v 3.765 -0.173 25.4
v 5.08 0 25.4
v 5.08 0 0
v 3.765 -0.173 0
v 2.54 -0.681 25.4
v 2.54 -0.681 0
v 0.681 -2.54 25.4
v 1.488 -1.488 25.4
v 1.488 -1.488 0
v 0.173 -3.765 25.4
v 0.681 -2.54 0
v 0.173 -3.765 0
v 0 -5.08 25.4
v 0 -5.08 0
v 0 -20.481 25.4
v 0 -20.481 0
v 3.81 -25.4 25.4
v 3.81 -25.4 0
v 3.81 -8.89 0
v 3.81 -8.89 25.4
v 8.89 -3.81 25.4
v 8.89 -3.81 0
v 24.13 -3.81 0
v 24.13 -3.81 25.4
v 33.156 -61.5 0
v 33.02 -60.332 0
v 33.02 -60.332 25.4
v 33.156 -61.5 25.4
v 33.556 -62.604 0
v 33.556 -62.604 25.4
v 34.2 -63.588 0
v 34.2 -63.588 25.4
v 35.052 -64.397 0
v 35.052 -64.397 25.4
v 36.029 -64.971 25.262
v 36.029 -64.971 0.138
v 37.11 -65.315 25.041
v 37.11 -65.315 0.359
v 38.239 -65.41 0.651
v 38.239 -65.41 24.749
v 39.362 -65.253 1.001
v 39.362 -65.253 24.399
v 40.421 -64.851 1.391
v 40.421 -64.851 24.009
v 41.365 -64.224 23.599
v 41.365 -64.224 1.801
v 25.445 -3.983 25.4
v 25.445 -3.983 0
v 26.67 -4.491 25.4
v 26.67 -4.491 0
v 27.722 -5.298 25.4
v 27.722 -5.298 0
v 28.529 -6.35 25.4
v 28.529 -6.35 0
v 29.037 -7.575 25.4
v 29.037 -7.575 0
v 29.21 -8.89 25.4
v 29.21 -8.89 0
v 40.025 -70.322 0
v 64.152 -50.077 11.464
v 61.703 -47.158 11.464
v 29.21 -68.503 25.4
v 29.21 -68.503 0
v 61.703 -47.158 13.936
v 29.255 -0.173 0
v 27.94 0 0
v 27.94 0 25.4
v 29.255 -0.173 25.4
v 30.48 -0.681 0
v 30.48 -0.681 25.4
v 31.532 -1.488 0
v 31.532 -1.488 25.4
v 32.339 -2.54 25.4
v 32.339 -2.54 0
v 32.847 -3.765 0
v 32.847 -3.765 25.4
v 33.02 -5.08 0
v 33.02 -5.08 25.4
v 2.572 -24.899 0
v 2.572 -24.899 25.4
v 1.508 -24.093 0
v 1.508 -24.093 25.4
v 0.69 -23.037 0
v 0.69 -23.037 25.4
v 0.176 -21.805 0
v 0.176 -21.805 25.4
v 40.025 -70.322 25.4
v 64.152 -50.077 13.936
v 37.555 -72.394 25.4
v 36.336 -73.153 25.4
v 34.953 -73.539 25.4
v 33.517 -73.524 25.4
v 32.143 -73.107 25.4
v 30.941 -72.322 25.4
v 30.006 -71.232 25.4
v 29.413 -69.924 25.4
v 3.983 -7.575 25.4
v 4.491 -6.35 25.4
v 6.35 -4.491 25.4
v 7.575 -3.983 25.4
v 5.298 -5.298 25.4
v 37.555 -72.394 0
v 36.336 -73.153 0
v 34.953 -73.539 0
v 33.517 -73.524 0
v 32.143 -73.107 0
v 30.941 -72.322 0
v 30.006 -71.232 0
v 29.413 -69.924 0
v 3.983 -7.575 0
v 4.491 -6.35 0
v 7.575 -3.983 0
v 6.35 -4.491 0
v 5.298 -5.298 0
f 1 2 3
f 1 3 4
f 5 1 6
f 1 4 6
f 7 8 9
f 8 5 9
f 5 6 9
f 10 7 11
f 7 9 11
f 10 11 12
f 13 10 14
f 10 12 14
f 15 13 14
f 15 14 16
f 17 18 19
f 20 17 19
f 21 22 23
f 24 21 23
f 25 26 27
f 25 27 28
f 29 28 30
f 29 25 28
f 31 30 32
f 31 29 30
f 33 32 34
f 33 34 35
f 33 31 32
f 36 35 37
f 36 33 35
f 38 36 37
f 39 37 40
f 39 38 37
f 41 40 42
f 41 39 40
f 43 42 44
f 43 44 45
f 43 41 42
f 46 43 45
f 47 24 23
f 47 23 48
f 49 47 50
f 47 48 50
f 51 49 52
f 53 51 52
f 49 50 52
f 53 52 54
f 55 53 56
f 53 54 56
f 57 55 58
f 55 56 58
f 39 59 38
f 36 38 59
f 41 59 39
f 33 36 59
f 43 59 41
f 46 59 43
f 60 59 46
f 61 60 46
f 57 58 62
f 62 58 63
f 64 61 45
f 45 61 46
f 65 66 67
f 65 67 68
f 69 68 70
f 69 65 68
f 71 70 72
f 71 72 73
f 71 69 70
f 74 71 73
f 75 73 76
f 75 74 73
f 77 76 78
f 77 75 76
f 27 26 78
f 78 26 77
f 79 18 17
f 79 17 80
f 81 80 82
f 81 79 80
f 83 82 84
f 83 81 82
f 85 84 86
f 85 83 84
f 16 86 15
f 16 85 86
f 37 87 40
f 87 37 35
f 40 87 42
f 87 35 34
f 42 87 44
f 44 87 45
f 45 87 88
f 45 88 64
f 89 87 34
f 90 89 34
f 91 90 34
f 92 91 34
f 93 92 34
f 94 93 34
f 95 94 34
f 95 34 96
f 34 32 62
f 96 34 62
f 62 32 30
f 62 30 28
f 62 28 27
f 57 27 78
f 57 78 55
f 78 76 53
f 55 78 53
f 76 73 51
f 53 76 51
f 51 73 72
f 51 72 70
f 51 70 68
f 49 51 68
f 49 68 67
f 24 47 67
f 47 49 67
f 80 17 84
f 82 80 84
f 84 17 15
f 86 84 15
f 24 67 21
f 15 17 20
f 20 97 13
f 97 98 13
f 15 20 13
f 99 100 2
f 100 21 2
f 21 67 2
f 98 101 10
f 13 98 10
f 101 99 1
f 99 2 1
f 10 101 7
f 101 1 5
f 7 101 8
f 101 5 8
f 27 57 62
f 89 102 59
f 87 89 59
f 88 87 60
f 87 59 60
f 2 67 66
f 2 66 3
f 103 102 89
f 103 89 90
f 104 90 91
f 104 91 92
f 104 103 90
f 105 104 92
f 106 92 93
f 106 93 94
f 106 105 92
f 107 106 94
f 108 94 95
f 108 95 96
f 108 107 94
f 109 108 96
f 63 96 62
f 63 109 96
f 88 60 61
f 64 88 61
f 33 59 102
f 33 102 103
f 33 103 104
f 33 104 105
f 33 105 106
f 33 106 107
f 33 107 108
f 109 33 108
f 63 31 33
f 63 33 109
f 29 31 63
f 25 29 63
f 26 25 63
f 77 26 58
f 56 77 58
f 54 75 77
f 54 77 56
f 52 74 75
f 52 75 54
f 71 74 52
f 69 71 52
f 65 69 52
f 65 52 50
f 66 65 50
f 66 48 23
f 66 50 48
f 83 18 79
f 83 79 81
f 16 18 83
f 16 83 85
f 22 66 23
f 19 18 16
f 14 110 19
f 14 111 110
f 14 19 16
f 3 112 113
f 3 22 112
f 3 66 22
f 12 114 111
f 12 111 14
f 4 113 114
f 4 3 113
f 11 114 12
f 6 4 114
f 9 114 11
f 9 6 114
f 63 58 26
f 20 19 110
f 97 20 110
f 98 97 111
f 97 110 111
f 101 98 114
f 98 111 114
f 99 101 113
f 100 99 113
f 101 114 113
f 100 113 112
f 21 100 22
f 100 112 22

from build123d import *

# Parameters (mm, degrees)
F1_DEPTH     = 25.4
F2_T1_DEPTH  = 25.4
F2_T3_DEPTH  = 25.4
F2_T5_DEPTH  = 25.4
F2_T7_DEPTH  = 50.8
F2_T9_DEPTH  = 50.8
F2_T11_DEPTH = 49.9934442484
F3_SIZE2     = 11.4636064984
F3_SIZE      = 31.496
F3_2_SIZE2   = 11.4636064984
F3_2_SIZE    = 31.496
F4_T1_DEPTH  = 50.8
F5_T1_DEPTH  = 68.1227876391


# Not quite as in the source:
# - a fillet or chamfer that OpenCascade refuses, or shapes differently, is made with other operations: its cross-section is extruded or revolved along the edge and cut away or added


with BuildPart() as f1:
    # F0 (on Top) → F1 (new body)
    with BuildSketch(Plane.XY):
        Polygon((33.02, 0), (0, 0), (0, -25.4), (3.81, -25.4), (3.81, -3.81), (29.21, -3.81), (29.21, -76.2), (33.02, -76.2), (33.02, -71.2263982276), align=None)
        Polygon((61.7030253754, -47.1584822141), (33.02, -71.2263982276), (33.02, -76.2), (64.1520461684, -50.0771115423), align=None)
    extrude(amount=F1_DEPTH)

    # F2: fillet of radius 5.08 on 6 edges, made by hand

    # F2_s2 → F2_t1 (join)
    with BuildSketch(Plane.XY):
        with BuildLine():
            ThreePointArc((3.81, -8.89), (5.2978975516, -5.2978975516), (8.89, -3.81))
            Line((8.89, -3.81), (3.81, -3.81))
            Line((3.81, -3.81), (3.81, -8.89))
        make_face()
    extrude(amount=F2_T1_DEPTH)

    # F2_s4 → F2_t3 (join)
    with BuildSketch(Plane.XY):
        with BuildLine():
            ThreePointArc((24.13, -3.81), (27.7221024484, -5.2978975516), (29.21, -8.89))
            Line((29.21, -8.89), (29.21, -3.81))
            Line((29.21, -3.81), (24.13, -3.81))
        make_face()
    extrude(amount=F2_T3_DEPTH)

    # F2_s6 → F2_t5 (join)
    with BuildSketch(Plane.XY):
        with BuildLine():
            ThreePointArc((33.02, -60.3323030715), (35.9530992304, -64.9363466296), (41.3653610572, -64.2238088425))
            Line((41.3653610572, -64.2238088425), (33.02, -71.2263982276))
            Line((33.02, -71.2263982276), (33.02, -60.3323030715))
        make_face()
    extrude(amount=F2_T5_DEPTH)

    # F2_s8 → F2_t7 (cut)
    with BuildSketch(Plane.XY.offset(-12.7)):
        with BuildLine():
            ThreePointArc((27.94, 0), (31.5321024484, -1.4878975516), (33.02, -5.08))
            Line((33.02, -5.08), (33.02, 0))
            Line((33.02, 0), (27.94, 0))
        make_face()
    extrude(amount=F2_T7_DEPTH, mode=Mode.SUBTRACT)

    # F2_s10 → F2_t9 (cut)
    with BuildSketch(Plane.XY.offset(-12.7)):
        with BuildLine():
            ThreePointArc((5.08, 0), (1.4878975516, -1.4878975516), (0, -5.08))
            Line((0, -5.08), (0, 0))
            Line((0, 0), (5.08, 0))
        make_face()
    extrude(amount=F2_T9_DEPTH, mode=Mode.SUBTRACT)

    # F2_s12 → F2_t11 (cut)
    with BuildSketch(Plane.XY.offset(-12.2967221242)):
        with BuildLine():
            ThreePointArc((3.81, -25.4), (1.0639073716, -23.5921631237), (0, -20.4813111503))
            Line((0, -20.4813111503), (0, -25.4))
            Line((0, -25.4), (3.81, -25.4))
        make_face()
    extrude(amount=F2_T11_DEPTH, mode=Mode.SUBTRACT)

    # F3
    f3_edges = [f1.edges().sort_by_distance(p)[0] for p in [
        (62.927536, -48.617797, 25.4),
    ]]
    f3_side = f1.faces().sort_by_distance((30.827761, -2.192239, 25.4))[0]
    chamfer(f3_edges, length=F3_SIZE, length2=F3_SIZE2, reference=f3_side)

    # F3#2
    f3_2_edges = [f1.edges().sort_by_distance(p)[0] for p in [
        (62.927536, -48.617797, 0),
    ]]
    f3_2_side = f1.faces().sort_by_distance((30.827761, -2.192239, 0))[0]
    chamfer(f3_2_edges, length=F3_2_SIZE, length2=F3_2_SIZE2, reference=f3_2_side)

    # F4: fillet of radius 5.08 on 1 edges, made by hand

    # F4_s2 → F4_t1 (cut)
    with BuildSketch(Plane.XY.offset(-12.7)):
        with BuildLine():
            ThreePointArc((34.29, -76.2), (30.6978975516, -74.7121024484), (29.21, -71.12))
            Line((29.21, -71.12), (29.21, -76.2))
            Line((29.21, -76.2), (34.29, -76.2))
        make_face()
    extrude(amount=F4_T1_DEPTH, mode=Mode.SUBTRACT)

    # F5: fillet of radius 5.08 on 1 edges, made by hand

    # F5_s2 → F5_t1 (cut)
    with BuildSketch(Plane.XY.offset(-21.3613938196)):
        with BuildLine():
            ThreePointArc((37.5553610572, -72.3943802096), (32.1430992304, -73.1069179967), (29.21, -68.5028744386))
            Line((29.21, -68.5028744386), (28.702, -68.5028744386))
            ThreePointArc((28.702, -68.5028744386), (28.702, -71.12), (33.0571094194, -76.5702958467))
            Line((33.0571094194, -76.5702958467), (33.495726487, -76.4639649832))
            Line((33.495726487, -76.4639649832), (37.8818971629, -72.7835307867))
            Line((37.8818971629, -72.7835307867), (37.5553610572, -72.3943802096))
        make_face()
    extrude(amount=F5_T1_DEPTH, mode=Mode.SUBTRACT)


solid = f1.part
